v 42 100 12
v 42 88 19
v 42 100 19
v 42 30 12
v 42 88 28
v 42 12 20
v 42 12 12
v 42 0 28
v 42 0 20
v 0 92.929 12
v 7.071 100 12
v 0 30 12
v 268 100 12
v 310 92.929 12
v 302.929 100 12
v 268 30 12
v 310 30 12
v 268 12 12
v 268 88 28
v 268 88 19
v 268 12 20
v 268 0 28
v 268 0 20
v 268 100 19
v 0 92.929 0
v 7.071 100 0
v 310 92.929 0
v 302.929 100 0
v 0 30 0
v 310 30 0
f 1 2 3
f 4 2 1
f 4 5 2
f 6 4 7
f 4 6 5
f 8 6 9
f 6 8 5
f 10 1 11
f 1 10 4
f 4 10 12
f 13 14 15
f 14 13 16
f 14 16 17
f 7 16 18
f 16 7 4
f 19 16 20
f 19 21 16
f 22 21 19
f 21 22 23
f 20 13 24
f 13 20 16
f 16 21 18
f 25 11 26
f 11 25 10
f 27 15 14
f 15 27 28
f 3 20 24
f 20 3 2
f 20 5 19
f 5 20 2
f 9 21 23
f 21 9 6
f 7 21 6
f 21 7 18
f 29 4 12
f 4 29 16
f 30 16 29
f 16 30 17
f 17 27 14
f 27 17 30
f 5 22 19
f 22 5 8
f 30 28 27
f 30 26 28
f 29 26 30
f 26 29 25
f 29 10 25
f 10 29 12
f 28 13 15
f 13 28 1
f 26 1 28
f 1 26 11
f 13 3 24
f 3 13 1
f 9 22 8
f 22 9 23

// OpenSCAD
include <../src/wardrobe.scad>;
plank_zx_rear_side();
//github_openscad -o wardrobe_1/plank_zx_rear_side.stl -D wardrobe_n=1 -D cutting_edge=0 -D break_view_length=0 wardrobe_1/plank_zx_rear_side_stl.scad
